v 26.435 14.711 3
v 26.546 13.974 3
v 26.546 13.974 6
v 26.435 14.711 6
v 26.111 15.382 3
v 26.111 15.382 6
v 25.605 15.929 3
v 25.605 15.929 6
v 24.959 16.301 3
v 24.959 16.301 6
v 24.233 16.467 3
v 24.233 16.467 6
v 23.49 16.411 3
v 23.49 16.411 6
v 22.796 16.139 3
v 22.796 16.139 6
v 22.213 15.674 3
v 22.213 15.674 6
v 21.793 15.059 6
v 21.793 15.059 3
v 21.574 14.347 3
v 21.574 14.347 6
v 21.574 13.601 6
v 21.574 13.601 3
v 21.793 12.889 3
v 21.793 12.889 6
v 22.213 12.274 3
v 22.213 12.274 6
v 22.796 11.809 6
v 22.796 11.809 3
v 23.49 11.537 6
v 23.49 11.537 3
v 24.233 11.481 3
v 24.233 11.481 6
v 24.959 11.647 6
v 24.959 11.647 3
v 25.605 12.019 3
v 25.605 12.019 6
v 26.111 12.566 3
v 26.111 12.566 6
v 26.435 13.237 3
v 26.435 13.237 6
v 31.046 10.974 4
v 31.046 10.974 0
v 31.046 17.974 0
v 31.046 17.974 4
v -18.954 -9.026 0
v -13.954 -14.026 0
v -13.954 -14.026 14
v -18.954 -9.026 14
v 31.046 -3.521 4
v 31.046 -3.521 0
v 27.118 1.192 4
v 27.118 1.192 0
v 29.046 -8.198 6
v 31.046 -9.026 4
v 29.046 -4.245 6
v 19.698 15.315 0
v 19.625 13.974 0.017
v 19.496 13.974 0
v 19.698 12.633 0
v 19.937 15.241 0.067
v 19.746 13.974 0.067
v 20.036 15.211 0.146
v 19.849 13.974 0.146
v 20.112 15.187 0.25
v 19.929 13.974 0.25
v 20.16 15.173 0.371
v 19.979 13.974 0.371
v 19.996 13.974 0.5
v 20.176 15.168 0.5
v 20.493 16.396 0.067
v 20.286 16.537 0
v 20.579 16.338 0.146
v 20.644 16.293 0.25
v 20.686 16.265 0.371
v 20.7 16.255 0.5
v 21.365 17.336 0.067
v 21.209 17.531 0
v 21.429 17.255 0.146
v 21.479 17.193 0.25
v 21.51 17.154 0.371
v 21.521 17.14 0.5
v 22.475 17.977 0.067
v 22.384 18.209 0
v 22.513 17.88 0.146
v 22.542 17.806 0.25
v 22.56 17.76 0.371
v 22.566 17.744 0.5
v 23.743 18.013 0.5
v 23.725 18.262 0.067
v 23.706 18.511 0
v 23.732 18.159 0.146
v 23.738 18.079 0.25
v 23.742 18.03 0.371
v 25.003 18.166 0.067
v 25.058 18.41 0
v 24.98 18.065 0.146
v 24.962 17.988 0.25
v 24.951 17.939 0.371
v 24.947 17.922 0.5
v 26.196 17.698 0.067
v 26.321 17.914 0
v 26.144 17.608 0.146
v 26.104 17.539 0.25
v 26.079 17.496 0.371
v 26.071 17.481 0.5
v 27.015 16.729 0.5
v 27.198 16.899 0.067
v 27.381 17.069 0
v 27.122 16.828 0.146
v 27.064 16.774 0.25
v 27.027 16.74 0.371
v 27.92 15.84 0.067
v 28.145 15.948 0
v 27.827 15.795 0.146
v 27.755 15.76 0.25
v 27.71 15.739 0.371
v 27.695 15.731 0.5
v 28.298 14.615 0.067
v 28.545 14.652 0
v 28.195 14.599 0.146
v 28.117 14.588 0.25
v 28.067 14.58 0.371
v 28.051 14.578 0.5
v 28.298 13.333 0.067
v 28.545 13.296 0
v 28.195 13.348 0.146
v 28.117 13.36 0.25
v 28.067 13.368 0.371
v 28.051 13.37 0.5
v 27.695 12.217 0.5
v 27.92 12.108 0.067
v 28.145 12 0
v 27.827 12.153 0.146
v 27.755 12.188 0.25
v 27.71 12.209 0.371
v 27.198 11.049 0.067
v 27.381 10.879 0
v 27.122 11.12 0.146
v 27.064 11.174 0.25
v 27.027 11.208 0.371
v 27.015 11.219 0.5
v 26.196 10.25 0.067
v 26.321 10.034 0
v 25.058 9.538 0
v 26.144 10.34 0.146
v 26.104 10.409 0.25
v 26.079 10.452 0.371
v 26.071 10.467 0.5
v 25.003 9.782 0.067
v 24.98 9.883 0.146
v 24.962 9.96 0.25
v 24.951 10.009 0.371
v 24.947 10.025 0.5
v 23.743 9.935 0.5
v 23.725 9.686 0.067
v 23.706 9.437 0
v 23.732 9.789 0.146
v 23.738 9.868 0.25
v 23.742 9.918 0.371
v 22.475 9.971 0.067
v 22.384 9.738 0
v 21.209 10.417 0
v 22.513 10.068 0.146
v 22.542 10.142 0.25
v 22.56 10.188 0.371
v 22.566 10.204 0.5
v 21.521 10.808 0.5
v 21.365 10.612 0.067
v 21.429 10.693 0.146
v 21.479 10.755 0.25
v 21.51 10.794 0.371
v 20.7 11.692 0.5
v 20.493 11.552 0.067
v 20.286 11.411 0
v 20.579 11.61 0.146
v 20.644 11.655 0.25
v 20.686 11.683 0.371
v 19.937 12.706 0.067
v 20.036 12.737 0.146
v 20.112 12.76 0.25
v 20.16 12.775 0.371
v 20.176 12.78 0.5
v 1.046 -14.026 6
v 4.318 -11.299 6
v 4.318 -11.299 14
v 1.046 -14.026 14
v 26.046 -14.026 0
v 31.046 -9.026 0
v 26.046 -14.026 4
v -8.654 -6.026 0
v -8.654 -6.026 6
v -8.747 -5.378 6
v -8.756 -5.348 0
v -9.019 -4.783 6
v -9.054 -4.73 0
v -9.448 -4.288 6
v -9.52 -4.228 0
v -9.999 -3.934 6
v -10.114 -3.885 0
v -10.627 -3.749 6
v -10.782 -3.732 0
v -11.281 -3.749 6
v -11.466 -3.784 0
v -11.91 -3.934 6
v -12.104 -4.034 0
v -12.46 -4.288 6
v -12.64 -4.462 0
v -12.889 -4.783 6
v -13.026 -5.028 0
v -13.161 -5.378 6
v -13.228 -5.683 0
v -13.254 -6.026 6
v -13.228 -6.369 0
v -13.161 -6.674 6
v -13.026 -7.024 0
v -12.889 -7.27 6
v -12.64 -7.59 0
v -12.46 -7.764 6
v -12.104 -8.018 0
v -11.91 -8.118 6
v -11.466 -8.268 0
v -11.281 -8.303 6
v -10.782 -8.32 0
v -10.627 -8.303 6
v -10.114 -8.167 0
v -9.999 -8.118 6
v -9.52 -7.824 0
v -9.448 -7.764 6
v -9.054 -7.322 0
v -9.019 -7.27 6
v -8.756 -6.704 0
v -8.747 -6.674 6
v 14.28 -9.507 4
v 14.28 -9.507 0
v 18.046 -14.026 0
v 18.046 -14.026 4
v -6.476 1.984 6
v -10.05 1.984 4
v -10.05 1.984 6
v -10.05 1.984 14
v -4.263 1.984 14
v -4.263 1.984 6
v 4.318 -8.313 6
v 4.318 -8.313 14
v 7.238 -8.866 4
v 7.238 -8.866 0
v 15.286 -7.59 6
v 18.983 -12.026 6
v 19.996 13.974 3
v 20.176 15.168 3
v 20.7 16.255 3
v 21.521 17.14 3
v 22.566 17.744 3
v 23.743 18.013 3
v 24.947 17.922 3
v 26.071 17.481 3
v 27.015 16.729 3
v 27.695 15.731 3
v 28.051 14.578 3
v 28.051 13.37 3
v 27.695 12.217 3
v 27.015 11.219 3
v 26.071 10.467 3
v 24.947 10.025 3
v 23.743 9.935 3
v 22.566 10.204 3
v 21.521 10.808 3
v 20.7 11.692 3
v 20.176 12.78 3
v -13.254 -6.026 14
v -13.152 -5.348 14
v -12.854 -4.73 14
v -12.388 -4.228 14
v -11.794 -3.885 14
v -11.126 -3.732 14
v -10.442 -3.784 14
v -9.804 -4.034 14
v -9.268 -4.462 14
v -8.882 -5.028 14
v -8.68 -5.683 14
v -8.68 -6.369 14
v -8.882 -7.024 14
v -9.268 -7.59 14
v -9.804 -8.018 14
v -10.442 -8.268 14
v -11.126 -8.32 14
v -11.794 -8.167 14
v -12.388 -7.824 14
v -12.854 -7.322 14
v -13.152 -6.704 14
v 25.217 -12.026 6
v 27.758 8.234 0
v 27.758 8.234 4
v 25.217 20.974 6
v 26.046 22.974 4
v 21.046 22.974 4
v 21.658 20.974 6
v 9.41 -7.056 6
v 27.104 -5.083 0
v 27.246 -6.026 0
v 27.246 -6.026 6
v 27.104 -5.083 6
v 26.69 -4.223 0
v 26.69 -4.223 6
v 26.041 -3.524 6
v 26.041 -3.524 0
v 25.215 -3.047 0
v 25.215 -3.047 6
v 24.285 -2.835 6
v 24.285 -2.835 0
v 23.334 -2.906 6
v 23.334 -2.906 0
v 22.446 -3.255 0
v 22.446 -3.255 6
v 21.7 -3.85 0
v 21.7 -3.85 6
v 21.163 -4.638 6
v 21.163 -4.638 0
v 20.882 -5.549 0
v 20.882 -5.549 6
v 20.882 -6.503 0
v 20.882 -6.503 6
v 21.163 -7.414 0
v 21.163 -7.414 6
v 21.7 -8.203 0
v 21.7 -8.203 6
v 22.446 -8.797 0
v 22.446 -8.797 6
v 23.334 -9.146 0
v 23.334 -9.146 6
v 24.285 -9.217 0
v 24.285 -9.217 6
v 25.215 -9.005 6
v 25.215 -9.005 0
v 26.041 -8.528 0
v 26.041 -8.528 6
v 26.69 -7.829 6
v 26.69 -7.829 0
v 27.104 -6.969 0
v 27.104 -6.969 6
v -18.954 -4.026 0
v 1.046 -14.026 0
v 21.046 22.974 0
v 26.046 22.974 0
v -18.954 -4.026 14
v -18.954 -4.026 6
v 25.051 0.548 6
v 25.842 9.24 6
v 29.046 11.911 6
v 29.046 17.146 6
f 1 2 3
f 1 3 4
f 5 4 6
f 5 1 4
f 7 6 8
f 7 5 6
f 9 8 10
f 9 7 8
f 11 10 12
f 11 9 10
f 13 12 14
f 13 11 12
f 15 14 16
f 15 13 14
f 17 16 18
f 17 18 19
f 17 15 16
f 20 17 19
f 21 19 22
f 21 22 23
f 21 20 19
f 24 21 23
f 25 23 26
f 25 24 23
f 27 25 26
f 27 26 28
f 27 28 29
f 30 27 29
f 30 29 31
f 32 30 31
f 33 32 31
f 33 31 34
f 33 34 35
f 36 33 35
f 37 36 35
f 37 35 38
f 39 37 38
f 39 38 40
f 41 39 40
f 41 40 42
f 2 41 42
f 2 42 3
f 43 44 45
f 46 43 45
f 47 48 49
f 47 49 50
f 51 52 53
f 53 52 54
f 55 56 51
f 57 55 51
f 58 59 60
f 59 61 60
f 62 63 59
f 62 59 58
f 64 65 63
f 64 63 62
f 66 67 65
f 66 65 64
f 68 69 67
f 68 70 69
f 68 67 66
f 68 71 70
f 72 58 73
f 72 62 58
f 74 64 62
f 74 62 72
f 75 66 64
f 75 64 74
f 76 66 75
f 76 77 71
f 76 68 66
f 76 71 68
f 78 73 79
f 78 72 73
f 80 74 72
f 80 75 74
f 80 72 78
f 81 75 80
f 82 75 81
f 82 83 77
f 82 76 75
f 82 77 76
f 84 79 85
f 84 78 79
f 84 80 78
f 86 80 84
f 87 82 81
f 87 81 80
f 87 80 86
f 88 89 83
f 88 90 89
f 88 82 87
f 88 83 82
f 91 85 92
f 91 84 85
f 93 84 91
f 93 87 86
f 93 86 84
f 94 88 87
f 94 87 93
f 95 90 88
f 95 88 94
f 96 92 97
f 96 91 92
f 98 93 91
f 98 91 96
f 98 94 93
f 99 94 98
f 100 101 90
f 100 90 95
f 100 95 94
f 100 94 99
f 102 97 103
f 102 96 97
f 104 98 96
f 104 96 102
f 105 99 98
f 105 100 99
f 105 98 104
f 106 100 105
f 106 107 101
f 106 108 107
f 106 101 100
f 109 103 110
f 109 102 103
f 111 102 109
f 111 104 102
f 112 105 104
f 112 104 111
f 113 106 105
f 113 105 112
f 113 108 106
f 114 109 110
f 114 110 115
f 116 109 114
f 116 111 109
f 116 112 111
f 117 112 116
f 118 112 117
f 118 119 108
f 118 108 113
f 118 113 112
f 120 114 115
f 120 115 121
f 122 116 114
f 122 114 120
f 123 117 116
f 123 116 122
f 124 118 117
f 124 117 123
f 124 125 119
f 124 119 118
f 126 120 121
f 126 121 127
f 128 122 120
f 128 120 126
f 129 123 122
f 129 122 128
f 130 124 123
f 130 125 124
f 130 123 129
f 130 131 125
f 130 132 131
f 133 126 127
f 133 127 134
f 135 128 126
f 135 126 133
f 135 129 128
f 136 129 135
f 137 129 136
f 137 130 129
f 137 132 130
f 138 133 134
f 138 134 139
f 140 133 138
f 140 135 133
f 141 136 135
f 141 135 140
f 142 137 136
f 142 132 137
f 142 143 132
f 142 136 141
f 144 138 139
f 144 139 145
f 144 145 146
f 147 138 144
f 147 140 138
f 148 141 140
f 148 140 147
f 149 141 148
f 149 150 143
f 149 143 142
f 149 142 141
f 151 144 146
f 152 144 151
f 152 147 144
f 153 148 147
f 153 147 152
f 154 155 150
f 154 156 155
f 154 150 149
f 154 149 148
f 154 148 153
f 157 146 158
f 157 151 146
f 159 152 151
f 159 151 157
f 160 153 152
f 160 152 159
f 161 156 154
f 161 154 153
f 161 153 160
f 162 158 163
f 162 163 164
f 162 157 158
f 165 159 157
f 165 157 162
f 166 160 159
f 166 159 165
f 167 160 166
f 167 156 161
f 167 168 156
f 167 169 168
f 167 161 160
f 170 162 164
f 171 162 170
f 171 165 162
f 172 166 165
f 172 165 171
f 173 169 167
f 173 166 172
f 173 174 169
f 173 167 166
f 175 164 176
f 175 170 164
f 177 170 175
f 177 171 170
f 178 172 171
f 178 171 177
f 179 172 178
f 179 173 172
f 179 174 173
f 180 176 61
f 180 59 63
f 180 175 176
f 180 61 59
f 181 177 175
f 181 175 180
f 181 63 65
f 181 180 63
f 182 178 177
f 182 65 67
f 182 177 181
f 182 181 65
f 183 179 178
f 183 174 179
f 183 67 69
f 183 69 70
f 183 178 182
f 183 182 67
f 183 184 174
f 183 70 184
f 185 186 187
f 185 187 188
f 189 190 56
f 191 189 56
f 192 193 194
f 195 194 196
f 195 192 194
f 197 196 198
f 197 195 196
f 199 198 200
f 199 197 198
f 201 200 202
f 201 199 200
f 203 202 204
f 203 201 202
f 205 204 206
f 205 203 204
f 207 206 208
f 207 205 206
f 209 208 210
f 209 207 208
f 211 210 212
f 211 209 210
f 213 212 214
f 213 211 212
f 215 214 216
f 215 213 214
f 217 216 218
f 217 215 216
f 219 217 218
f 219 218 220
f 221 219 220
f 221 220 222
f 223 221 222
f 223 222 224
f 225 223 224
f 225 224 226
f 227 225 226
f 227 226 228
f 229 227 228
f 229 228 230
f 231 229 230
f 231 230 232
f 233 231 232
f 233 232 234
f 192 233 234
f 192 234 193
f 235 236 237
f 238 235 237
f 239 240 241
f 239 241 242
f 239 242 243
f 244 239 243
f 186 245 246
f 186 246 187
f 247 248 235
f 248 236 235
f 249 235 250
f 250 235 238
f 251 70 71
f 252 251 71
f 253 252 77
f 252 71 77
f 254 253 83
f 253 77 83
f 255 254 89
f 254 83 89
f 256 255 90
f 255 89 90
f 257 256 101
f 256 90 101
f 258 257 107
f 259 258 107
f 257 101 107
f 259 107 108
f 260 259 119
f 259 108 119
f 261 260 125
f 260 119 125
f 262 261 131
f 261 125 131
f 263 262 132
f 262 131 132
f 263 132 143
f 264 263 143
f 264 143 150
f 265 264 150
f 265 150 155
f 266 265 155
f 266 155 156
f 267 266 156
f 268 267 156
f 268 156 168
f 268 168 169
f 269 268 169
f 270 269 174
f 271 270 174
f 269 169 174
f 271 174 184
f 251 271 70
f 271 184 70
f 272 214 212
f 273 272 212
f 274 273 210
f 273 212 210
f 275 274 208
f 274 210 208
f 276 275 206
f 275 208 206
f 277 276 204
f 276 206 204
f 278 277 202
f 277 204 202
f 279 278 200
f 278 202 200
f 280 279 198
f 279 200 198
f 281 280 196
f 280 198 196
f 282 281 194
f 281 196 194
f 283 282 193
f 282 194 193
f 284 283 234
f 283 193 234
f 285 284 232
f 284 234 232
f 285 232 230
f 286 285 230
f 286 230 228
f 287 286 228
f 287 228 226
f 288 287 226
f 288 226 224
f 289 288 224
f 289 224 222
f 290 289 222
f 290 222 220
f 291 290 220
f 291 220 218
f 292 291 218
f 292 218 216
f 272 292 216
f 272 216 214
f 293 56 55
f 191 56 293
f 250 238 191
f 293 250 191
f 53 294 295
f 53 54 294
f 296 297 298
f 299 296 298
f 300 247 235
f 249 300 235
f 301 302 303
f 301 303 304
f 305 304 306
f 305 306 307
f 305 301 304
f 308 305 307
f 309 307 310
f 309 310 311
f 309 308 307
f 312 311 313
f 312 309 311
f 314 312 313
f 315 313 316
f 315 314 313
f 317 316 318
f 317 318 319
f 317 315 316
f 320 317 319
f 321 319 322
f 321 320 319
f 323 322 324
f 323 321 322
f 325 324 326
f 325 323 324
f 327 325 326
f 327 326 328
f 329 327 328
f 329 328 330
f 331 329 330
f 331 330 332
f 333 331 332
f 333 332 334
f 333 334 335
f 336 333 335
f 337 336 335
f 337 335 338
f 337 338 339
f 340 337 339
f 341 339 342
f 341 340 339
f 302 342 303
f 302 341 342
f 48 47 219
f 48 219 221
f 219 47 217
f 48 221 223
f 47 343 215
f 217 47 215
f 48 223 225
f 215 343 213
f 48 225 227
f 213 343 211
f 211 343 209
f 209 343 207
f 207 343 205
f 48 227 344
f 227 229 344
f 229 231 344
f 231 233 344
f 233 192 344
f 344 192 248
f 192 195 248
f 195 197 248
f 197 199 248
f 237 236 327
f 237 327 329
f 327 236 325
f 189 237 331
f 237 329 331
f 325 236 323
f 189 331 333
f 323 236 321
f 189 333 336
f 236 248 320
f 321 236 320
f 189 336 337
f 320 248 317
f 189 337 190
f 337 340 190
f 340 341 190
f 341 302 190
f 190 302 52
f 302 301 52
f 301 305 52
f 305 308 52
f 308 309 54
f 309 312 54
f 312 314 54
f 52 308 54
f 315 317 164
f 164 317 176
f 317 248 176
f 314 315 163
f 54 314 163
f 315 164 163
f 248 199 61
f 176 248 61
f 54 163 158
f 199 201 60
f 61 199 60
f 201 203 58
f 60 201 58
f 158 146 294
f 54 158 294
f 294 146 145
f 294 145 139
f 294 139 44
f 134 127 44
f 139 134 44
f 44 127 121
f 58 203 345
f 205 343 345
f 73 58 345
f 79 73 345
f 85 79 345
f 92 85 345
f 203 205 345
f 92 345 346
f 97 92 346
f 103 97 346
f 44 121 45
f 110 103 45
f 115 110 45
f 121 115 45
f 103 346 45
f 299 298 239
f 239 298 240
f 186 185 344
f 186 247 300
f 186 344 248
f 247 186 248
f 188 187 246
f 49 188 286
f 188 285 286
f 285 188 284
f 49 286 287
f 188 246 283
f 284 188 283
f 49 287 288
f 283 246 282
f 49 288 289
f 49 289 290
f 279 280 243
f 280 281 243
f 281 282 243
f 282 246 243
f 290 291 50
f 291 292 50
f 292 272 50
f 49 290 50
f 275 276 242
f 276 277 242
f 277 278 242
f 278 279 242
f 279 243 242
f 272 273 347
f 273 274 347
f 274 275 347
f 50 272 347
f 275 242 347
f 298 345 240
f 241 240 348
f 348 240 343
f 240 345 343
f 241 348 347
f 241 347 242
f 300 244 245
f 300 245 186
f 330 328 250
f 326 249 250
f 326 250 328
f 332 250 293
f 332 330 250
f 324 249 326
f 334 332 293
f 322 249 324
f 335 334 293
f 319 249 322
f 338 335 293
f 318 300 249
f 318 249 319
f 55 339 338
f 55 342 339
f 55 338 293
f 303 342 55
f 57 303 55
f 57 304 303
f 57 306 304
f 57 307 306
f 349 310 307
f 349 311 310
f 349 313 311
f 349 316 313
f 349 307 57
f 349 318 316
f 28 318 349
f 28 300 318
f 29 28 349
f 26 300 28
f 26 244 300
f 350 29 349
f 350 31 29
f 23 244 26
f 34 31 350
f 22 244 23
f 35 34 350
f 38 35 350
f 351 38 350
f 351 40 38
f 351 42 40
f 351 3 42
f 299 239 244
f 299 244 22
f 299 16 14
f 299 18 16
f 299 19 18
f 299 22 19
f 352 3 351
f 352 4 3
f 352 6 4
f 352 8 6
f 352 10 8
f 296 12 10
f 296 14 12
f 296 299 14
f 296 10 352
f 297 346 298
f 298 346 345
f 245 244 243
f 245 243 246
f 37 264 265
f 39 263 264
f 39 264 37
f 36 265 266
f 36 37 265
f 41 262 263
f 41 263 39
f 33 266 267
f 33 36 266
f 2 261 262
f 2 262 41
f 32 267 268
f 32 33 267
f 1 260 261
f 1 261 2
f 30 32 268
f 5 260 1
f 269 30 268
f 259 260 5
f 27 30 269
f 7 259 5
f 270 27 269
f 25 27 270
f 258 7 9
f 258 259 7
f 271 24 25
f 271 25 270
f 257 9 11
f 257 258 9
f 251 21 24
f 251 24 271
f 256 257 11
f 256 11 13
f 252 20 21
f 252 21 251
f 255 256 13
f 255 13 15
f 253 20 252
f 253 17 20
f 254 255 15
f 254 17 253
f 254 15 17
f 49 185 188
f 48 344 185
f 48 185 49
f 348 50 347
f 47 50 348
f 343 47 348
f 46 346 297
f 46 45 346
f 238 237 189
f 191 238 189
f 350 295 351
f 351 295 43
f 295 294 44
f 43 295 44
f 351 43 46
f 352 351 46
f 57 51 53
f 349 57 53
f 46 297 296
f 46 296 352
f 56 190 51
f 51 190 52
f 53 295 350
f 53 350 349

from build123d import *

# Parameters (mm, degrees)
SKETCH_1_R          = 2.3
SKETCH_1_R_2        = 3.2
SKETCH_1_R_3        = 2.5
EXTRUDE_1_DEPTH     = 6
CHAMFER_1_SIZE      = 5
EXTRUDE_2_DEPTH     = 8
SKETCH_4_R          = 2.3
CUT_EXTRUDE_1_DEPTH = 8
CHAMFER_3_SIZE      = 2
SKETCH_5_R          = 4.05
CUT_EXTRUDE_2_DEPTH = 3
FILLET_1_R          = 0.5


with BuildPart() as part:
    # 草图1 → 凸台-拉伸1 (new body)
    with BuildSketch(Plane.XY):
        Polygon((21.045855827, 22.973933312), (-18.954144173, -4.026066688), (-18.954144173, -14.026066688), (1.045855827, -14.026066688), (11.078642712, -5.66541095), (18.045855827, -14.026066688), (31.045855827, -14.026066688), (31.045855827, -3.521043084), (23.917178911, 5.033369215), (31.045855827, 10.973933312), (31.045855827, 22.973933312), align=None)
        with Locations((-10.954144173, -6.026066688)):
            Circle(SKETCH_1_R, mode=Mode.SUBTRACT)
        with Locations((24.045855827, -6.026066688)):
            Circle(SKETCH_1_R_2, mode=Mode.SUBTRACT)
        with Locations((24.045855827, 13.973933312)):
            Circle(SKETCH_1_R_3, mode=Mode.SUBTRACT)
    extrude(amount=EXTRUDE_1_DEPTH)

    # 倒角1
    chamfer_1_edges = [part.edges().sort_by_distance(p)[0] for p in [
        (23.917178911, 5.033369215, 3),
        (31.045855827, -14.026066688, 3),
        (11.078642712, -5.66541095, 3),
        (-18.954144173, -14.026066688, 3),
        (31.045855827, 22.973933312, 3),
    ]]
    chamfer(chamfer_1_edges, length=CHAMFER_1_SIZE)

    # 草图3 → 凸台-拉伸2 (add)
    with BuildSketch(Plane.XY.offset(6)):
        Polygon((-10.05036615, 1.983983477), (-4.262738325, 1.983983477), (4.318113554, -8.313038778), (4.318113554, -11.299185249), (1.045855827, -14.026066688), (-13.954144173, -14.026066688), (-18.954144173, -9.026066688), (-18.954144173, -4.026066688), align=None)
    extrude(amount=EXTRUDE_2_DEPTH)

    # 草图4 → 切除-拉伸1 (cut)
    with BuildSketch(Plane(origin=(0, 0, 6), x_dir=(-1, 0, 0), z_dir=(0, 0, -1))):
        with Locations((10.954144173, -6.026066688)):
            Circle(SKETCH_4_R)
    extrude(amount=-CUT_EXTRUDE_1_DEPTH, mode=Mode.SUBTRACT)

    # 倒角3
    chamfer_3_edges = [part.edges().sort_by_distance(p)[0] for p in [
        (10.758550512, -9.186425149, 6),
        (16.162710269, -11.766292018, 6),
        (22.045855827, -14.026066688, 6),
        (28.545855827, -11.526066688, 6),
        (31.045855827, -6.273554886, 6),
        (29.081978368, -1.164390133, 6),
        (27.438193109, 4.713277016, 6),
        (5.497744838, 12.478958395, 6),
        (23.545855827, 22.973933312, 6),
        (28.545855827, 20.473933312, 6),
        (31.045855827, 14.473933312, 6),
        (29.402070568, 9.604112263, 6),
    ]]
    chamfer(chamfer_3_edges, length=CHAMFER_3_SIZE)

    # 草图5 → 切除-拉伸2 (cut)
    with BuildSketch(Plane(origin=(0, 0, 0), x_dir=(-1, 0, 0), z_dir=(0, 0, -1))):
        with Locations((-24.045855827, 13.973933312)):
            Circle(SKETCH_5_R)
    extrude(amount=-CUT_EXTRUDE_2_DEPTH, mode=Mode.SUBTRACT)

    # 圆角1
    fillet_1_edges = [part.edges().sort_by_distance(p)[0] for p in [
        (28.095855827, 13.973933312, 0),
    ]]
    fillet(fillet_1_edges, radius=FILLET_1_R)


solid = part.part
